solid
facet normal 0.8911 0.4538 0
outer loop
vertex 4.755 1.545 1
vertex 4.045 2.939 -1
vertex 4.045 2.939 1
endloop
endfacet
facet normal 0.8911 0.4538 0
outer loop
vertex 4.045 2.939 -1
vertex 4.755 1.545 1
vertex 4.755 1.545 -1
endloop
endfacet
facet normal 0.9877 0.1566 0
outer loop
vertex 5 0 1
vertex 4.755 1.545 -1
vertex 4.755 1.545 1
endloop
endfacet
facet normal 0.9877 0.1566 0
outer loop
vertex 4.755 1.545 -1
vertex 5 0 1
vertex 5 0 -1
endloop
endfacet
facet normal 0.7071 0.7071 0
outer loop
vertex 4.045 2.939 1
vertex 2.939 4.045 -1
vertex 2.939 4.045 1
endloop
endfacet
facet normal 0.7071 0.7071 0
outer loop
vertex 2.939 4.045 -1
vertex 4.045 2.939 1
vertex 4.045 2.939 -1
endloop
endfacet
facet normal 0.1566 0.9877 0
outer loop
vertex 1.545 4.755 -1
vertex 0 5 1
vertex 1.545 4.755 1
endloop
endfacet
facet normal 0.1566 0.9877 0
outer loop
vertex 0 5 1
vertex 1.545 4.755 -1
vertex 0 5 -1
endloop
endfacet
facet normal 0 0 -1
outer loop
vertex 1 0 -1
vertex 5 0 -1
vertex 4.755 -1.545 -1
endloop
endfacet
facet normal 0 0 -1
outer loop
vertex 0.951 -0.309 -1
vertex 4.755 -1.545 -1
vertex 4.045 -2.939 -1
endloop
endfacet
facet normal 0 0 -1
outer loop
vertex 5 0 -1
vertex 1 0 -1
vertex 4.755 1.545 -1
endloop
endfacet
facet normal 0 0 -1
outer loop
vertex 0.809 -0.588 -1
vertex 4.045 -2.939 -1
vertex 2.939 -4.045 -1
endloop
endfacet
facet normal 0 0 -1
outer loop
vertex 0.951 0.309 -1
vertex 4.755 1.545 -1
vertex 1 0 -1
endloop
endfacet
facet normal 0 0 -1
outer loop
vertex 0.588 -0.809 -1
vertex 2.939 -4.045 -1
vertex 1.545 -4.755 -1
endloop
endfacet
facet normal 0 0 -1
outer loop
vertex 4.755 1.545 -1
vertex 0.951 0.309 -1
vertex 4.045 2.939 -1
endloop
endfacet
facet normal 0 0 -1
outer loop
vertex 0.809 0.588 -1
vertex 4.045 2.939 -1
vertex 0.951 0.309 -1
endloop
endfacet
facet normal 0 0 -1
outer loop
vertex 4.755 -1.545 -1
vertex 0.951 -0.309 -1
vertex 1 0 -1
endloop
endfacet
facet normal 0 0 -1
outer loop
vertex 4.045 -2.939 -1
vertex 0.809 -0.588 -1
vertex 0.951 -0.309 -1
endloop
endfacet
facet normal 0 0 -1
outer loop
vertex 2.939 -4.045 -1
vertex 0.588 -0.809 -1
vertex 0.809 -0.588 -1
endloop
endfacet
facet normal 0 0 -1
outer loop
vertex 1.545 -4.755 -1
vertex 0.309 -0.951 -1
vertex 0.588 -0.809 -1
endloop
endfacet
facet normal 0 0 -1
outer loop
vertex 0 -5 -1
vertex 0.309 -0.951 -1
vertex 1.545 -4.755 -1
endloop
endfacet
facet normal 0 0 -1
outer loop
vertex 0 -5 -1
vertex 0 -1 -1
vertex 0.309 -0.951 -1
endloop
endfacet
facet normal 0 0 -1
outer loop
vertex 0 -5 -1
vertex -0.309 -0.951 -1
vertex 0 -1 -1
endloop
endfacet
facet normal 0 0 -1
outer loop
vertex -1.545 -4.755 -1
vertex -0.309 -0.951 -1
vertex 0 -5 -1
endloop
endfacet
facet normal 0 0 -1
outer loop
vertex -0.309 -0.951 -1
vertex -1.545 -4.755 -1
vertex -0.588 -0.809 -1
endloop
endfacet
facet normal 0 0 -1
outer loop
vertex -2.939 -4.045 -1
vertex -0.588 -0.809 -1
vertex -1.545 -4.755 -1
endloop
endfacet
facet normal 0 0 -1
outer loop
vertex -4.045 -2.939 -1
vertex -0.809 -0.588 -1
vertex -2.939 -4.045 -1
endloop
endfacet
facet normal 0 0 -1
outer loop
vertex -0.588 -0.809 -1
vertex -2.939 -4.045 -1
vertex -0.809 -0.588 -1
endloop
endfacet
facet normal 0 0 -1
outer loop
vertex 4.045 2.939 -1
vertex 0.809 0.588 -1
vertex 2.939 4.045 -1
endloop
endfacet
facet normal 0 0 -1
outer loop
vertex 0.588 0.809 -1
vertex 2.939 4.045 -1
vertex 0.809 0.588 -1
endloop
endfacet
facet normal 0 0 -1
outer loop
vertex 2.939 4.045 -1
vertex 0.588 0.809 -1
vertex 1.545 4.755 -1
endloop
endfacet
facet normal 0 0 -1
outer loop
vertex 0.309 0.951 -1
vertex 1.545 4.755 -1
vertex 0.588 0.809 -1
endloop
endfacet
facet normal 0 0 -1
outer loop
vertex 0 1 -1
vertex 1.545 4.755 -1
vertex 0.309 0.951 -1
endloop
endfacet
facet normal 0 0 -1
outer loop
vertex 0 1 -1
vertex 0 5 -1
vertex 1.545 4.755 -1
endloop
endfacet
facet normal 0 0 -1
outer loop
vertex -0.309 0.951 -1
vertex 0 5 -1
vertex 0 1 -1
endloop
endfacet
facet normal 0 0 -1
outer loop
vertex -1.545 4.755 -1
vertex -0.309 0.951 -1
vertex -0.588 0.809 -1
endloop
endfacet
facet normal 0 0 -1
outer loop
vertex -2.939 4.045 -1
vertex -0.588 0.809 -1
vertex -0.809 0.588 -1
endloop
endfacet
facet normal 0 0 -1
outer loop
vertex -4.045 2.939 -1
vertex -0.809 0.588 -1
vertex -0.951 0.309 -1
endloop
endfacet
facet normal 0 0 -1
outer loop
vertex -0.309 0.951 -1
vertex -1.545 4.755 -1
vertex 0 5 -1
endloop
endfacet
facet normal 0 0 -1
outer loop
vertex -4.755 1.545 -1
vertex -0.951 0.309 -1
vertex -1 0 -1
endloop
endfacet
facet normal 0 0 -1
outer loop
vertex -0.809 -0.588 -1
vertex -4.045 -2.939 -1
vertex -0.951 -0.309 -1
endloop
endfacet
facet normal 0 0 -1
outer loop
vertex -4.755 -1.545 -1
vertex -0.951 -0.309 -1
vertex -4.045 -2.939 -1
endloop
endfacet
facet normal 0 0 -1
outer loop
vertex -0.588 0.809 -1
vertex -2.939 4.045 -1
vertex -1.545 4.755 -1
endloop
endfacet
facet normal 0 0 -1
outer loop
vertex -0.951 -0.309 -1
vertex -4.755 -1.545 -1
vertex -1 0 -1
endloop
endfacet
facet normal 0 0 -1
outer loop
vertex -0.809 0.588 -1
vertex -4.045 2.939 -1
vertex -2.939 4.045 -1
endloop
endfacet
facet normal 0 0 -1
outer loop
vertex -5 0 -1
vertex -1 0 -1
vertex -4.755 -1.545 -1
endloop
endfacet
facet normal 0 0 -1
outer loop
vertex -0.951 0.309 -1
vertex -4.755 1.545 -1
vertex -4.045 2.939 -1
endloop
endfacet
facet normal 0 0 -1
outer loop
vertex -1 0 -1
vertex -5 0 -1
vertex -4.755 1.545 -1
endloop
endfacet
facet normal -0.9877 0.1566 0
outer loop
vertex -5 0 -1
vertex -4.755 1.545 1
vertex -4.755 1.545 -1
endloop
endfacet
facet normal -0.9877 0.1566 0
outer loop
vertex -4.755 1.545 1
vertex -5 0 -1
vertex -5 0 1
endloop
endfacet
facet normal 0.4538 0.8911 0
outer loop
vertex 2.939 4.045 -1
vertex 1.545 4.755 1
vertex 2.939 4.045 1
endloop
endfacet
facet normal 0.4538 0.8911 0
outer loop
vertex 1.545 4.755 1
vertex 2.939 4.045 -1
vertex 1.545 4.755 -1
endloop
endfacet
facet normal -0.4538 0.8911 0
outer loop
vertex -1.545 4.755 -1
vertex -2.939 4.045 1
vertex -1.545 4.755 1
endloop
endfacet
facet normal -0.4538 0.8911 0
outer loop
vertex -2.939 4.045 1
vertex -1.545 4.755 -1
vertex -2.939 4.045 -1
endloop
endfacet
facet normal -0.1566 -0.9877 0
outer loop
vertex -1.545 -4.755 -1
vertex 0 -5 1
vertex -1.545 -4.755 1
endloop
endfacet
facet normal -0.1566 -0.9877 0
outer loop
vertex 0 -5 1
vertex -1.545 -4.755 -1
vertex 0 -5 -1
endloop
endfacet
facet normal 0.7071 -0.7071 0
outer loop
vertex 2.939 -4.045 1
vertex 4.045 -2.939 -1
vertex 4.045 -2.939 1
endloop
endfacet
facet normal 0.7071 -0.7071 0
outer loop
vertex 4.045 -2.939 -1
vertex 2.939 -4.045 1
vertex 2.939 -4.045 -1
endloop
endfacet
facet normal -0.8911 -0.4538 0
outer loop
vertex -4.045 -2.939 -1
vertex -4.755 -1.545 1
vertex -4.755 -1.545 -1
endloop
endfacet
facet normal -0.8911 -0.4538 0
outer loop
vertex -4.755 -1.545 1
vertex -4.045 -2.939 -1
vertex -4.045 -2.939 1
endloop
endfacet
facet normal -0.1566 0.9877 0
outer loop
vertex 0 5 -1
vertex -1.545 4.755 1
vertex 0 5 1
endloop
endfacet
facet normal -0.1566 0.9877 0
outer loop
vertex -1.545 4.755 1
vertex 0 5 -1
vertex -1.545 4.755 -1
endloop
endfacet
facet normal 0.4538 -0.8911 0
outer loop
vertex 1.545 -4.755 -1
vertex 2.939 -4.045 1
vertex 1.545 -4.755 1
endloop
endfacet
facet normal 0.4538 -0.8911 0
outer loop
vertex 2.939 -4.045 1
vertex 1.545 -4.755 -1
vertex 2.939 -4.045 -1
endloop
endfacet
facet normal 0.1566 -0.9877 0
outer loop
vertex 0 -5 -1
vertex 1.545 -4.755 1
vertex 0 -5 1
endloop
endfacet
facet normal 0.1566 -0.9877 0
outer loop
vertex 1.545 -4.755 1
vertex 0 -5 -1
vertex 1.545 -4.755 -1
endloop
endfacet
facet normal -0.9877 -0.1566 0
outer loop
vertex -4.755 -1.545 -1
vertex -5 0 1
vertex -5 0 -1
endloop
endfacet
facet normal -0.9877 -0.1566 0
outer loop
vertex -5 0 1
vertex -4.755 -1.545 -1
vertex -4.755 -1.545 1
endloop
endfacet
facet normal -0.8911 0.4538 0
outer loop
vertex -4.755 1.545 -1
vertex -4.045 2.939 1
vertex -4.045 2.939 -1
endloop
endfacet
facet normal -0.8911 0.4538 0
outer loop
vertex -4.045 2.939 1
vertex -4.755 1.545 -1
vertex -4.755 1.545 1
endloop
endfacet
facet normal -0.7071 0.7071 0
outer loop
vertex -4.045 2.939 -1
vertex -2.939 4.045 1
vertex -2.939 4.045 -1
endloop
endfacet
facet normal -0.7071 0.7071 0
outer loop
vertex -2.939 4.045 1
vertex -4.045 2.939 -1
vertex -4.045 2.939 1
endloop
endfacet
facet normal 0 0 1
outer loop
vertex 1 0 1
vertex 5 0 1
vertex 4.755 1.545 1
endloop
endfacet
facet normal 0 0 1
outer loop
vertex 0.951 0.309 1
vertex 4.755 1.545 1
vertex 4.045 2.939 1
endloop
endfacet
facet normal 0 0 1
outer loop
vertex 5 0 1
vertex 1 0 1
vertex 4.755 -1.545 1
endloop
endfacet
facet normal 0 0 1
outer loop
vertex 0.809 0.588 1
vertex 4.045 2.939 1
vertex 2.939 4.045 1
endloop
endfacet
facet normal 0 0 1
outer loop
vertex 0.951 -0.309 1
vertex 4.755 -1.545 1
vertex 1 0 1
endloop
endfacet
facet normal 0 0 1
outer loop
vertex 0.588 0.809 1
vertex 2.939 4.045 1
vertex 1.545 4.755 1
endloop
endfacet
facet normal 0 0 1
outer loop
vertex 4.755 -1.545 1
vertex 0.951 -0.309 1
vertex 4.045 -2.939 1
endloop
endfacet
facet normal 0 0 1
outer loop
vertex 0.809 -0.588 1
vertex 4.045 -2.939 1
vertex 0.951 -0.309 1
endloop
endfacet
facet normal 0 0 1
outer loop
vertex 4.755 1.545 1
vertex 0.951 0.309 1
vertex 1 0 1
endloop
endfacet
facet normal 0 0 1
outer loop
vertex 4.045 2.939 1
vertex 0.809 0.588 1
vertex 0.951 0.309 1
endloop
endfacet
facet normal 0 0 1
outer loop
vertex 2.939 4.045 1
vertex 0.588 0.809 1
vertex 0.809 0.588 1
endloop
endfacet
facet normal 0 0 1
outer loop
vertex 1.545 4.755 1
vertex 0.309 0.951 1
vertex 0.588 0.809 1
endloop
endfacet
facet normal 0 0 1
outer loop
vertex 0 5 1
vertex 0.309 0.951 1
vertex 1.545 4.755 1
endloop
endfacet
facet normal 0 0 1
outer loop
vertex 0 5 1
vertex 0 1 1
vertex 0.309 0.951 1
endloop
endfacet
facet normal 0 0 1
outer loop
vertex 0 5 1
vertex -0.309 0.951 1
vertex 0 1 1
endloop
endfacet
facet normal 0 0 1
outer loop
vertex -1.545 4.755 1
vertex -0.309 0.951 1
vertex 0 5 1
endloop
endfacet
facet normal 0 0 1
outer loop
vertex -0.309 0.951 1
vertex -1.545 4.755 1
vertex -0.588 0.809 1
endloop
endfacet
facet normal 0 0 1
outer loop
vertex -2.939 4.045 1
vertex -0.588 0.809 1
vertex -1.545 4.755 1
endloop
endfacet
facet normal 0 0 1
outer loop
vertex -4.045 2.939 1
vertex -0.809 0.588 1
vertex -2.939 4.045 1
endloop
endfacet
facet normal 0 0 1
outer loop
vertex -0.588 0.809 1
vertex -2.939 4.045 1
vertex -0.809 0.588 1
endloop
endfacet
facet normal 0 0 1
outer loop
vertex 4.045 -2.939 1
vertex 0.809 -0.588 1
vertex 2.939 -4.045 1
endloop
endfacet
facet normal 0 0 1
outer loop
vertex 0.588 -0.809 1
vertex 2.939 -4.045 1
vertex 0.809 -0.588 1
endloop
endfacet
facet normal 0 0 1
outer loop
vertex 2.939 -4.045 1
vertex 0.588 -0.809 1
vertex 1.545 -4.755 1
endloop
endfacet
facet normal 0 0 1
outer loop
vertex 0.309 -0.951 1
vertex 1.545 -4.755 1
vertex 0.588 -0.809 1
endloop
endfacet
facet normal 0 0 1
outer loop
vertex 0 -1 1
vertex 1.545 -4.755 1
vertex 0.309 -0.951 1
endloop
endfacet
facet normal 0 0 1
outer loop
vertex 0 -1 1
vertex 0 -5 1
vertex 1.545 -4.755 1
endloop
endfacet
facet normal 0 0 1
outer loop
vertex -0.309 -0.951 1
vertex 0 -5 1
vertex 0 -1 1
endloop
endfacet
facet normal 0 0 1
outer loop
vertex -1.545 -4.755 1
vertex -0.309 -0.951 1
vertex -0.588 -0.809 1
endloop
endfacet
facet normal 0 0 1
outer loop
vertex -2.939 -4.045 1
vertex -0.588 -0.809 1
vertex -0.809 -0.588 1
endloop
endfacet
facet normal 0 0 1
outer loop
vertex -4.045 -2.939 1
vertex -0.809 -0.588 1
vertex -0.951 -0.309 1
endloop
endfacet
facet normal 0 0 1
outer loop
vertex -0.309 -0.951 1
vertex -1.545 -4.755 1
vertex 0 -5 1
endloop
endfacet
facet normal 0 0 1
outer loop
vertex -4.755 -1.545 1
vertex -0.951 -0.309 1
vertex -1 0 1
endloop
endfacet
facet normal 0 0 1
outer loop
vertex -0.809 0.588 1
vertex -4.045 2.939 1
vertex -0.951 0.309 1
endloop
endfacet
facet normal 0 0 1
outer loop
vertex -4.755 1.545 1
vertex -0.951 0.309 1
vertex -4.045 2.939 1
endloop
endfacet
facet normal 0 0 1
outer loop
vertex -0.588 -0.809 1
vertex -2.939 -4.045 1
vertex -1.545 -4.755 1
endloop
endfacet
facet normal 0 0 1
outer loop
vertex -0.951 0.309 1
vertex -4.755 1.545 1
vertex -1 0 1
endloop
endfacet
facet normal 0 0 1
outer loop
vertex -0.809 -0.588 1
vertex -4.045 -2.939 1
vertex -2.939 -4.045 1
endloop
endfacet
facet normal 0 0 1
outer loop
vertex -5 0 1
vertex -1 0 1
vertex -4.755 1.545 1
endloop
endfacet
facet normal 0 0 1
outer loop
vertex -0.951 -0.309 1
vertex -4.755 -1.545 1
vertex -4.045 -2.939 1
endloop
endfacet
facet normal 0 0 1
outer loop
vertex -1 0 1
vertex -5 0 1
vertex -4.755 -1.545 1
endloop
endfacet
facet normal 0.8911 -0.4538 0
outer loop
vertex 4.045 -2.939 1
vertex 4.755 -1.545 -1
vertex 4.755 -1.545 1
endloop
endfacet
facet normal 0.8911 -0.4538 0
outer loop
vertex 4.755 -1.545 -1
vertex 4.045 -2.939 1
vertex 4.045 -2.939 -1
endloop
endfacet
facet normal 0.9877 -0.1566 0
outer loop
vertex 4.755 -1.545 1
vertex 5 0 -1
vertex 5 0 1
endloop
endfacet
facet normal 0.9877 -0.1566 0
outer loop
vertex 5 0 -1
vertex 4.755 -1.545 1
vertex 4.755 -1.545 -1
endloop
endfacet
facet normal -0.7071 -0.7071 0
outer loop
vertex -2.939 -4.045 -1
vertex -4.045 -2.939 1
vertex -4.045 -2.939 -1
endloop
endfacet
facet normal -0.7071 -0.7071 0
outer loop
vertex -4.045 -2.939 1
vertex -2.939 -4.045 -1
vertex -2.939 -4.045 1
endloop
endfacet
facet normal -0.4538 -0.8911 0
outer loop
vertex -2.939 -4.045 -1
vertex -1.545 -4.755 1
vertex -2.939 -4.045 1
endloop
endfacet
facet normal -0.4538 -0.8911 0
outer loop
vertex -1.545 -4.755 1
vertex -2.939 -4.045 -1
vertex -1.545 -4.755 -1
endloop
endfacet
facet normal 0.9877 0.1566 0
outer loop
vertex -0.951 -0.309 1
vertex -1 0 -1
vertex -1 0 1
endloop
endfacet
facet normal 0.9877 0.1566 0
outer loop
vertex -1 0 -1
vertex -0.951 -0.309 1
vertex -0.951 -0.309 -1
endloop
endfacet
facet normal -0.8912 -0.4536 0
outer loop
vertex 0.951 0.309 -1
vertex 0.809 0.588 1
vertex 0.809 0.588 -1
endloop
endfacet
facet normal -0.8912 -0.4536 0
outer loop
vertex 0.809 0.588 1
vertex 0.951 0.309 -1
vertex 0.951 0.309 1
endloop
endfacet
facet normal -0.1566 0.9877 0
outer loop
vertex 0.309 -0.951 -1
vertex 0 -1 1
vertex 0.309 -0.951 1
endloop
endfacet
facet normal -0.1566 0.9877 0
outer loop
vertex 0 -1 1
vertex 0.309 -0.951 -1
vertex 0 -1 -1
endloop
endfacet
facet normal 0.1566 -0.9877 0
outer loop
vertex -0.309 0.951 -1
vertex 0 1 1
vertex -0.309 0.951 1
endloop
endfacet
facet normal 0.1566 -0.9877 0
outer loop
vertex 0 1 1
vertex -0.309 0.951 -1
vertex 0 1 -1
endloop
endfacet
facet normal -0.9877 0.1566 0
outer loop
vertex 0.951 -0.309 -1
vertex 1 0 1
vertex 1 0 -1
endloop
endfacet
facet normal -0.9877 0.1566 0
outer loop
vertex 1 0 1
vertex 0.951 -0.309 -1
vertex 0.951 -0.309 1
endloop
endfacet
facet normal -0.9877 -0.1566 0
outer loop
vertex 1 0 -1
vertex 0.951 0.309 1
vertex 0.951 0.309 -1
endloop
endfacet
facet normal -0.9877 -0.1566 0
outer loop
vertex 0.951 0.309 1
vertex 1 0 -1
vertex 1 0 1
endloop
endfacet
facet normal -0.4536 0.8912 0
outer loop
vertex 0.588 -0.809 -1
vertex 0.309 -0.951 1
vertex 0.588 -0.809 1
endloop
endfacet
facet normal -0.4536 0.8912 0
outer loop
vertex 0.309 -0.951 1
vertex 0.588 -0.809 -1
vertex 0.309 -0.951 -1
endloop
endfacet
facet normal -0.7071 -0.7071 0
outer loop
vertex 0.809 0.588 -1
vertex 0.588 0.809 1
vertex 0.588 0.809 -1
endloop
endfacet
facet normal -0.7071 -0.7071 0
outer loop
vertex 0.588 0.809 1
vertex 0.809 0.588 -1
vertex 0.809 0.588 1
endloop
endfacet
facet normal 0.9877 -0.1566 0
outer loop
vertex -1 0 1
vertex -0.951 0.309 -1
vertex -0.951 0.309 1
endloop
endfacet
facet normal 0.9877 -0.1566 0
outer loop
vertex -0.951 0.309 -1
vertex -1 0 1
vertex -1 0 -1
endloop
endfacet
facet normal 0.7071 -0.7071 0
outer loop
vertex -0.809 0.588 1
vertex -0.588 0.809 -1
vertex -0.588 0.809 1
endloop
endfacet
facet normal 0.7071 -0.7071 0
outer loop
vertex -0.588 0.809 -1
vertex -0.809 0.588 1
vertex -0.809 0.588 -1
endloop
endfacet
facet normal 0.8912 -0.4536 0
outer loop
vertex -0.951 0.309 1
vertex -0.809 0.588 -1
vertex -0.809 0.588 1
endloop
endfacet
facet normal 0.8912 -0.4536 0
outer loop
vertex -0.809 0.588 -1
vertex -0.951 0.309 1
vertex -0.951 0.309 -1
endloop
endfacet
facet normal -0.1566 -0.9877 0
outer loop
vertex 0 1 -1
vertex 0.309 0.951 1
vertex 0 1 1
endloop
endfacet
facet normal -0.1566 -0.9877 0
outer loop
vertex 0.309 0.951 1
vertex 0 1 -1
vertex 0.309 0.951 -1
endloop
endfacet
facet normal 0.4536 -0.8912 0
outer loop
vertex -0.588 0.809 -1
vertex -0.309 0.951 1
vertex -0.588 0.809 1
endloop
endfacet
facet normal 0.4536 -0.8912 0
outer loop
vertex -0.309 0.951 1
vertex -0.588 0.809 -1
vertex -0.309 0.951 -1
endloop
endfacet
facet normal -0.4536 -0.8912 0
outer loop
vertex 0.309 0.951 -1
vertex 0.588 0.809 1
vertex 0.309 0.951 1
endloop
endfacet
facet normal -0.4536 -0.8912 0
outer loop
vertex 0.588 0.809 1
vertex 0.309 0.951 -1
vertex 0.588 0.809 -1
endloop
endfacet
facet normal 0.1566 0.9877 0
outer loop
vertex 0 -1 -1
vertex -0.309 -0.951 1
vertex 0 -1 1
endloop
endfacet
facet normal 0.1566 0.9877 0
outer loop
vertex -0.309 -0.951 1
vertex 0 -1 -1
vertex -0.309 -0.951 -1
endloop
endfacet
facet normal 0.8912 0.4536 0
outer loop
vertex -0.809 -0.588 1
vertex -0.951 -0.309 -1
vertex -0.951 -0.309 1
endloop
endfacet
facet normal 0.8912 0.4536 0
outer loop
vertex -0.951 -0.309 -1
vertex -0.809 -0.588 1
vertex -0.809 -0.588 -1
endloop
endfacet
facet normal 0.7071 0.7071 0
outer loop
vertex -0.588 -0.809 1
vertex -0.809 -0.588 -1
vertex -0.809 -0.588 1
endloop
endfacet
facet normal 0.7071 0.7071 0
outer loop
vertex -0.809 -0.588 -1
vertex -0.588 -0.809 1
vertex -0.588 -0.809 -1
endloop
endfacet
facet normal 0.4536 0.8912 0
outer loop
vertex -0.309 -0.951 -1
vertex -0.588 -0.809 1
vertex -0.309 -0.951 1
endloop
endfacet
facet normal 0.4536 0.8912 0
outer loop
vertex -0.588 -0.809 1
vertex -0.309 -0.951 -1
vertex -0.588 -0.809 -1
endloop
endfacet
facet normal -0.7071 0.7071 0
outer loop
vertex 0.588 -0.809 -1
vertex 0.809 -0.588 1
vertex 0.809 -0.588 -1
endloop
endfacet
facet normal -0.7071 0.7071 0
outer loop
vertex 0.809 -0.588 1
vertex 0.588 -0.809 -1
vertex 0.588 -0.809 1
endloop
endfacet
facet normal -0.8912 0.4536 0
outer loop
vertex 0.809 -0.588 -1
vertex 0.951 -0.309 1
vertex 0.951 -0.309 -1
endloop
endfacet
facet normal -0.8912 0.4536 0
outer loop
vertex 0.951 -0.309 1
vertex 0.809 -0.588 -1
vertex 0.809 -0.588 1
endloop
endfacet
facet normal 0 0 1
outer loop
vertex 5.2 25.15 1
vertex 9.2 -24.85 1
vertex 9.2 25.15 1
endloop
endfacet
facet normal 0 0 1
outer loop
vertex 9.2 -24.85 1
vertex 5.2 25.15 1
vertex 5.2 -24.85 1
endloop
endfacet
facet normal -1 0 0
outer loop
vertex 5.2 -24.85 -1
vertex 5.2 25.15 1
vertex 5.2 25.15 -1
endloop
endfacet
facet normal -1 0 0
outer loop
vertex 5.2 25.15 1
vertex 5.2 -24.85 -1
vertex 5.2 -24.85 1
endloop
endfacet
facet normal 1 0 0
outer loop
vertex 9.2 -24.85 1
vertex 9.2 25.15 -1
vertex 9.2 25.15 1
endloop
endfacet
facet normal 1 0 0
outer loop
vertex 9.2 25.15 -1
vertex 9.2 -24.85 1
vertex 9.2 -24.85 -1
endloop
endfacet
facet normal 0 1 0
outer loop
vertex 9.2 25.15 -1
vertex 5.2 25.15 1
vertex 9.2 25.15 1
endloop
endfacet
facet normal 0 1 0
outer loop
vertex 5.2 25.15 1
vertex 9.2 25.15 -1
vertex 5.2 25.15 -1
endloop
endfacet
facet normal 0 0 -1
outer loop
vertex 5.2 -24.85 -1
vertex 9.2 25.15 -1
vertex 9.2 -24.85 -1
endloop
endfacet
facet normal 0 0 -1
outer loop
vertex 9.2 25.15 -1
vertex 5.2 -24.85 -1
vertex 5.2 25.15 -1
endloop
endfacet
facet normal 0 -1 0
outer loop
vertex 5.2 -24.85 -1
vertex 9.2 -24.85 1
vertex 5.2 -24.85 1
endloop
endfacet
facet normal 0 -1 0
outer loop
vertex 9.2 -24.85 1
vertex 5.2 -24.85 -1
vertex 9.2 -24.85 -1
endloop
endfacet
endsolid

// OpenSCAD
	

	radius = 5;
	numTeeth = 12;
	toothDepth = 1.5;
	height = 2;
	gearAngle = 0.6;

	depth = 3.141592 * radius / numTeeth;

	difference() {
		cylinder(h = height, r=radius, $fn=20, center=true);
		cylinder(h = height, r=1, $fn=20, center=true);
	}

	for(i= [0 : numTeeth]){
		
		rotate([0,0,(i/numTeeth)*360]){
			
			translate([radius - 0.1 ,0,0]){
		
				rotate([0,90,0]){
					gear(height, toothDepth, depth, gearAngle);
				}
			}
		}
	}


	flatGearLength = 50;

	translate([radius+0.2, +0.15-flatGearLength/2, -height/2]){
	
		

		difference() {

			cube([4,flatGearLength,height]);

			for(i= [2*3.141592*radius/numTeeth/2:2*3.141592*radius/numTeeth:flatGearLength]){
				
					

					translate([0,i,height/2]){
						
						rotate([0,90,0]){
						
							gear(height*1.1, toothDepth*1.1, depth, gearAngle);
					}
				}
			}

		}
	}



	module gear(width, depth, height, ratio){

		halfWidth = width / 2;
		haldDepth = depth / 2;
		//halfHeight = height / 2;
		

	/*
		0 = [-halfWidth, -haldDepth, 0];
		1 = [halfWidth, -haldDepth, 0];
		2 = [halfWidth, haldDepth, 0];
		3 = [-halfWidth, haldDepth, 0];

		4 = [-halfWidth*ratio, -haldDepth, height];
		5 = [halfWidth*ratio, -haldDepth, height];
		6 = [halfWidth*ratio, haldDepth, height];
		7 = [-halfWidth*ratio, haldDepth, height];
	*/
		


		polyhedron( 

			points = [[-halfWidth, -haldDepth, 0],[halfWidth, -haldDepth, 0],[halfWidth, haldDepth, 0],[-halfWidth, haldDepth, 0],[-halfWidth, -haldDepth*ratio, height],[halfWidth, -haldDepth*ratio, height],[halfWidth, haldDepth*ratio, height], [-halfWidth, haldDepth*ratio, height]], 

		triangles = [ 

			[0,1,3], [1,2,3], 		//bottom
	
			[0,1,4], [1,4,5] ,		// frount side

			[1,2,5], [2,5,6], 		// right side

			[2,3,6], [3,6,7], 		// back side

			[0,3,4], [3,4,7],		// left side

			[4,5,7], [5,6,7]		// top

		
		], $fn=20

		);




	}
	
